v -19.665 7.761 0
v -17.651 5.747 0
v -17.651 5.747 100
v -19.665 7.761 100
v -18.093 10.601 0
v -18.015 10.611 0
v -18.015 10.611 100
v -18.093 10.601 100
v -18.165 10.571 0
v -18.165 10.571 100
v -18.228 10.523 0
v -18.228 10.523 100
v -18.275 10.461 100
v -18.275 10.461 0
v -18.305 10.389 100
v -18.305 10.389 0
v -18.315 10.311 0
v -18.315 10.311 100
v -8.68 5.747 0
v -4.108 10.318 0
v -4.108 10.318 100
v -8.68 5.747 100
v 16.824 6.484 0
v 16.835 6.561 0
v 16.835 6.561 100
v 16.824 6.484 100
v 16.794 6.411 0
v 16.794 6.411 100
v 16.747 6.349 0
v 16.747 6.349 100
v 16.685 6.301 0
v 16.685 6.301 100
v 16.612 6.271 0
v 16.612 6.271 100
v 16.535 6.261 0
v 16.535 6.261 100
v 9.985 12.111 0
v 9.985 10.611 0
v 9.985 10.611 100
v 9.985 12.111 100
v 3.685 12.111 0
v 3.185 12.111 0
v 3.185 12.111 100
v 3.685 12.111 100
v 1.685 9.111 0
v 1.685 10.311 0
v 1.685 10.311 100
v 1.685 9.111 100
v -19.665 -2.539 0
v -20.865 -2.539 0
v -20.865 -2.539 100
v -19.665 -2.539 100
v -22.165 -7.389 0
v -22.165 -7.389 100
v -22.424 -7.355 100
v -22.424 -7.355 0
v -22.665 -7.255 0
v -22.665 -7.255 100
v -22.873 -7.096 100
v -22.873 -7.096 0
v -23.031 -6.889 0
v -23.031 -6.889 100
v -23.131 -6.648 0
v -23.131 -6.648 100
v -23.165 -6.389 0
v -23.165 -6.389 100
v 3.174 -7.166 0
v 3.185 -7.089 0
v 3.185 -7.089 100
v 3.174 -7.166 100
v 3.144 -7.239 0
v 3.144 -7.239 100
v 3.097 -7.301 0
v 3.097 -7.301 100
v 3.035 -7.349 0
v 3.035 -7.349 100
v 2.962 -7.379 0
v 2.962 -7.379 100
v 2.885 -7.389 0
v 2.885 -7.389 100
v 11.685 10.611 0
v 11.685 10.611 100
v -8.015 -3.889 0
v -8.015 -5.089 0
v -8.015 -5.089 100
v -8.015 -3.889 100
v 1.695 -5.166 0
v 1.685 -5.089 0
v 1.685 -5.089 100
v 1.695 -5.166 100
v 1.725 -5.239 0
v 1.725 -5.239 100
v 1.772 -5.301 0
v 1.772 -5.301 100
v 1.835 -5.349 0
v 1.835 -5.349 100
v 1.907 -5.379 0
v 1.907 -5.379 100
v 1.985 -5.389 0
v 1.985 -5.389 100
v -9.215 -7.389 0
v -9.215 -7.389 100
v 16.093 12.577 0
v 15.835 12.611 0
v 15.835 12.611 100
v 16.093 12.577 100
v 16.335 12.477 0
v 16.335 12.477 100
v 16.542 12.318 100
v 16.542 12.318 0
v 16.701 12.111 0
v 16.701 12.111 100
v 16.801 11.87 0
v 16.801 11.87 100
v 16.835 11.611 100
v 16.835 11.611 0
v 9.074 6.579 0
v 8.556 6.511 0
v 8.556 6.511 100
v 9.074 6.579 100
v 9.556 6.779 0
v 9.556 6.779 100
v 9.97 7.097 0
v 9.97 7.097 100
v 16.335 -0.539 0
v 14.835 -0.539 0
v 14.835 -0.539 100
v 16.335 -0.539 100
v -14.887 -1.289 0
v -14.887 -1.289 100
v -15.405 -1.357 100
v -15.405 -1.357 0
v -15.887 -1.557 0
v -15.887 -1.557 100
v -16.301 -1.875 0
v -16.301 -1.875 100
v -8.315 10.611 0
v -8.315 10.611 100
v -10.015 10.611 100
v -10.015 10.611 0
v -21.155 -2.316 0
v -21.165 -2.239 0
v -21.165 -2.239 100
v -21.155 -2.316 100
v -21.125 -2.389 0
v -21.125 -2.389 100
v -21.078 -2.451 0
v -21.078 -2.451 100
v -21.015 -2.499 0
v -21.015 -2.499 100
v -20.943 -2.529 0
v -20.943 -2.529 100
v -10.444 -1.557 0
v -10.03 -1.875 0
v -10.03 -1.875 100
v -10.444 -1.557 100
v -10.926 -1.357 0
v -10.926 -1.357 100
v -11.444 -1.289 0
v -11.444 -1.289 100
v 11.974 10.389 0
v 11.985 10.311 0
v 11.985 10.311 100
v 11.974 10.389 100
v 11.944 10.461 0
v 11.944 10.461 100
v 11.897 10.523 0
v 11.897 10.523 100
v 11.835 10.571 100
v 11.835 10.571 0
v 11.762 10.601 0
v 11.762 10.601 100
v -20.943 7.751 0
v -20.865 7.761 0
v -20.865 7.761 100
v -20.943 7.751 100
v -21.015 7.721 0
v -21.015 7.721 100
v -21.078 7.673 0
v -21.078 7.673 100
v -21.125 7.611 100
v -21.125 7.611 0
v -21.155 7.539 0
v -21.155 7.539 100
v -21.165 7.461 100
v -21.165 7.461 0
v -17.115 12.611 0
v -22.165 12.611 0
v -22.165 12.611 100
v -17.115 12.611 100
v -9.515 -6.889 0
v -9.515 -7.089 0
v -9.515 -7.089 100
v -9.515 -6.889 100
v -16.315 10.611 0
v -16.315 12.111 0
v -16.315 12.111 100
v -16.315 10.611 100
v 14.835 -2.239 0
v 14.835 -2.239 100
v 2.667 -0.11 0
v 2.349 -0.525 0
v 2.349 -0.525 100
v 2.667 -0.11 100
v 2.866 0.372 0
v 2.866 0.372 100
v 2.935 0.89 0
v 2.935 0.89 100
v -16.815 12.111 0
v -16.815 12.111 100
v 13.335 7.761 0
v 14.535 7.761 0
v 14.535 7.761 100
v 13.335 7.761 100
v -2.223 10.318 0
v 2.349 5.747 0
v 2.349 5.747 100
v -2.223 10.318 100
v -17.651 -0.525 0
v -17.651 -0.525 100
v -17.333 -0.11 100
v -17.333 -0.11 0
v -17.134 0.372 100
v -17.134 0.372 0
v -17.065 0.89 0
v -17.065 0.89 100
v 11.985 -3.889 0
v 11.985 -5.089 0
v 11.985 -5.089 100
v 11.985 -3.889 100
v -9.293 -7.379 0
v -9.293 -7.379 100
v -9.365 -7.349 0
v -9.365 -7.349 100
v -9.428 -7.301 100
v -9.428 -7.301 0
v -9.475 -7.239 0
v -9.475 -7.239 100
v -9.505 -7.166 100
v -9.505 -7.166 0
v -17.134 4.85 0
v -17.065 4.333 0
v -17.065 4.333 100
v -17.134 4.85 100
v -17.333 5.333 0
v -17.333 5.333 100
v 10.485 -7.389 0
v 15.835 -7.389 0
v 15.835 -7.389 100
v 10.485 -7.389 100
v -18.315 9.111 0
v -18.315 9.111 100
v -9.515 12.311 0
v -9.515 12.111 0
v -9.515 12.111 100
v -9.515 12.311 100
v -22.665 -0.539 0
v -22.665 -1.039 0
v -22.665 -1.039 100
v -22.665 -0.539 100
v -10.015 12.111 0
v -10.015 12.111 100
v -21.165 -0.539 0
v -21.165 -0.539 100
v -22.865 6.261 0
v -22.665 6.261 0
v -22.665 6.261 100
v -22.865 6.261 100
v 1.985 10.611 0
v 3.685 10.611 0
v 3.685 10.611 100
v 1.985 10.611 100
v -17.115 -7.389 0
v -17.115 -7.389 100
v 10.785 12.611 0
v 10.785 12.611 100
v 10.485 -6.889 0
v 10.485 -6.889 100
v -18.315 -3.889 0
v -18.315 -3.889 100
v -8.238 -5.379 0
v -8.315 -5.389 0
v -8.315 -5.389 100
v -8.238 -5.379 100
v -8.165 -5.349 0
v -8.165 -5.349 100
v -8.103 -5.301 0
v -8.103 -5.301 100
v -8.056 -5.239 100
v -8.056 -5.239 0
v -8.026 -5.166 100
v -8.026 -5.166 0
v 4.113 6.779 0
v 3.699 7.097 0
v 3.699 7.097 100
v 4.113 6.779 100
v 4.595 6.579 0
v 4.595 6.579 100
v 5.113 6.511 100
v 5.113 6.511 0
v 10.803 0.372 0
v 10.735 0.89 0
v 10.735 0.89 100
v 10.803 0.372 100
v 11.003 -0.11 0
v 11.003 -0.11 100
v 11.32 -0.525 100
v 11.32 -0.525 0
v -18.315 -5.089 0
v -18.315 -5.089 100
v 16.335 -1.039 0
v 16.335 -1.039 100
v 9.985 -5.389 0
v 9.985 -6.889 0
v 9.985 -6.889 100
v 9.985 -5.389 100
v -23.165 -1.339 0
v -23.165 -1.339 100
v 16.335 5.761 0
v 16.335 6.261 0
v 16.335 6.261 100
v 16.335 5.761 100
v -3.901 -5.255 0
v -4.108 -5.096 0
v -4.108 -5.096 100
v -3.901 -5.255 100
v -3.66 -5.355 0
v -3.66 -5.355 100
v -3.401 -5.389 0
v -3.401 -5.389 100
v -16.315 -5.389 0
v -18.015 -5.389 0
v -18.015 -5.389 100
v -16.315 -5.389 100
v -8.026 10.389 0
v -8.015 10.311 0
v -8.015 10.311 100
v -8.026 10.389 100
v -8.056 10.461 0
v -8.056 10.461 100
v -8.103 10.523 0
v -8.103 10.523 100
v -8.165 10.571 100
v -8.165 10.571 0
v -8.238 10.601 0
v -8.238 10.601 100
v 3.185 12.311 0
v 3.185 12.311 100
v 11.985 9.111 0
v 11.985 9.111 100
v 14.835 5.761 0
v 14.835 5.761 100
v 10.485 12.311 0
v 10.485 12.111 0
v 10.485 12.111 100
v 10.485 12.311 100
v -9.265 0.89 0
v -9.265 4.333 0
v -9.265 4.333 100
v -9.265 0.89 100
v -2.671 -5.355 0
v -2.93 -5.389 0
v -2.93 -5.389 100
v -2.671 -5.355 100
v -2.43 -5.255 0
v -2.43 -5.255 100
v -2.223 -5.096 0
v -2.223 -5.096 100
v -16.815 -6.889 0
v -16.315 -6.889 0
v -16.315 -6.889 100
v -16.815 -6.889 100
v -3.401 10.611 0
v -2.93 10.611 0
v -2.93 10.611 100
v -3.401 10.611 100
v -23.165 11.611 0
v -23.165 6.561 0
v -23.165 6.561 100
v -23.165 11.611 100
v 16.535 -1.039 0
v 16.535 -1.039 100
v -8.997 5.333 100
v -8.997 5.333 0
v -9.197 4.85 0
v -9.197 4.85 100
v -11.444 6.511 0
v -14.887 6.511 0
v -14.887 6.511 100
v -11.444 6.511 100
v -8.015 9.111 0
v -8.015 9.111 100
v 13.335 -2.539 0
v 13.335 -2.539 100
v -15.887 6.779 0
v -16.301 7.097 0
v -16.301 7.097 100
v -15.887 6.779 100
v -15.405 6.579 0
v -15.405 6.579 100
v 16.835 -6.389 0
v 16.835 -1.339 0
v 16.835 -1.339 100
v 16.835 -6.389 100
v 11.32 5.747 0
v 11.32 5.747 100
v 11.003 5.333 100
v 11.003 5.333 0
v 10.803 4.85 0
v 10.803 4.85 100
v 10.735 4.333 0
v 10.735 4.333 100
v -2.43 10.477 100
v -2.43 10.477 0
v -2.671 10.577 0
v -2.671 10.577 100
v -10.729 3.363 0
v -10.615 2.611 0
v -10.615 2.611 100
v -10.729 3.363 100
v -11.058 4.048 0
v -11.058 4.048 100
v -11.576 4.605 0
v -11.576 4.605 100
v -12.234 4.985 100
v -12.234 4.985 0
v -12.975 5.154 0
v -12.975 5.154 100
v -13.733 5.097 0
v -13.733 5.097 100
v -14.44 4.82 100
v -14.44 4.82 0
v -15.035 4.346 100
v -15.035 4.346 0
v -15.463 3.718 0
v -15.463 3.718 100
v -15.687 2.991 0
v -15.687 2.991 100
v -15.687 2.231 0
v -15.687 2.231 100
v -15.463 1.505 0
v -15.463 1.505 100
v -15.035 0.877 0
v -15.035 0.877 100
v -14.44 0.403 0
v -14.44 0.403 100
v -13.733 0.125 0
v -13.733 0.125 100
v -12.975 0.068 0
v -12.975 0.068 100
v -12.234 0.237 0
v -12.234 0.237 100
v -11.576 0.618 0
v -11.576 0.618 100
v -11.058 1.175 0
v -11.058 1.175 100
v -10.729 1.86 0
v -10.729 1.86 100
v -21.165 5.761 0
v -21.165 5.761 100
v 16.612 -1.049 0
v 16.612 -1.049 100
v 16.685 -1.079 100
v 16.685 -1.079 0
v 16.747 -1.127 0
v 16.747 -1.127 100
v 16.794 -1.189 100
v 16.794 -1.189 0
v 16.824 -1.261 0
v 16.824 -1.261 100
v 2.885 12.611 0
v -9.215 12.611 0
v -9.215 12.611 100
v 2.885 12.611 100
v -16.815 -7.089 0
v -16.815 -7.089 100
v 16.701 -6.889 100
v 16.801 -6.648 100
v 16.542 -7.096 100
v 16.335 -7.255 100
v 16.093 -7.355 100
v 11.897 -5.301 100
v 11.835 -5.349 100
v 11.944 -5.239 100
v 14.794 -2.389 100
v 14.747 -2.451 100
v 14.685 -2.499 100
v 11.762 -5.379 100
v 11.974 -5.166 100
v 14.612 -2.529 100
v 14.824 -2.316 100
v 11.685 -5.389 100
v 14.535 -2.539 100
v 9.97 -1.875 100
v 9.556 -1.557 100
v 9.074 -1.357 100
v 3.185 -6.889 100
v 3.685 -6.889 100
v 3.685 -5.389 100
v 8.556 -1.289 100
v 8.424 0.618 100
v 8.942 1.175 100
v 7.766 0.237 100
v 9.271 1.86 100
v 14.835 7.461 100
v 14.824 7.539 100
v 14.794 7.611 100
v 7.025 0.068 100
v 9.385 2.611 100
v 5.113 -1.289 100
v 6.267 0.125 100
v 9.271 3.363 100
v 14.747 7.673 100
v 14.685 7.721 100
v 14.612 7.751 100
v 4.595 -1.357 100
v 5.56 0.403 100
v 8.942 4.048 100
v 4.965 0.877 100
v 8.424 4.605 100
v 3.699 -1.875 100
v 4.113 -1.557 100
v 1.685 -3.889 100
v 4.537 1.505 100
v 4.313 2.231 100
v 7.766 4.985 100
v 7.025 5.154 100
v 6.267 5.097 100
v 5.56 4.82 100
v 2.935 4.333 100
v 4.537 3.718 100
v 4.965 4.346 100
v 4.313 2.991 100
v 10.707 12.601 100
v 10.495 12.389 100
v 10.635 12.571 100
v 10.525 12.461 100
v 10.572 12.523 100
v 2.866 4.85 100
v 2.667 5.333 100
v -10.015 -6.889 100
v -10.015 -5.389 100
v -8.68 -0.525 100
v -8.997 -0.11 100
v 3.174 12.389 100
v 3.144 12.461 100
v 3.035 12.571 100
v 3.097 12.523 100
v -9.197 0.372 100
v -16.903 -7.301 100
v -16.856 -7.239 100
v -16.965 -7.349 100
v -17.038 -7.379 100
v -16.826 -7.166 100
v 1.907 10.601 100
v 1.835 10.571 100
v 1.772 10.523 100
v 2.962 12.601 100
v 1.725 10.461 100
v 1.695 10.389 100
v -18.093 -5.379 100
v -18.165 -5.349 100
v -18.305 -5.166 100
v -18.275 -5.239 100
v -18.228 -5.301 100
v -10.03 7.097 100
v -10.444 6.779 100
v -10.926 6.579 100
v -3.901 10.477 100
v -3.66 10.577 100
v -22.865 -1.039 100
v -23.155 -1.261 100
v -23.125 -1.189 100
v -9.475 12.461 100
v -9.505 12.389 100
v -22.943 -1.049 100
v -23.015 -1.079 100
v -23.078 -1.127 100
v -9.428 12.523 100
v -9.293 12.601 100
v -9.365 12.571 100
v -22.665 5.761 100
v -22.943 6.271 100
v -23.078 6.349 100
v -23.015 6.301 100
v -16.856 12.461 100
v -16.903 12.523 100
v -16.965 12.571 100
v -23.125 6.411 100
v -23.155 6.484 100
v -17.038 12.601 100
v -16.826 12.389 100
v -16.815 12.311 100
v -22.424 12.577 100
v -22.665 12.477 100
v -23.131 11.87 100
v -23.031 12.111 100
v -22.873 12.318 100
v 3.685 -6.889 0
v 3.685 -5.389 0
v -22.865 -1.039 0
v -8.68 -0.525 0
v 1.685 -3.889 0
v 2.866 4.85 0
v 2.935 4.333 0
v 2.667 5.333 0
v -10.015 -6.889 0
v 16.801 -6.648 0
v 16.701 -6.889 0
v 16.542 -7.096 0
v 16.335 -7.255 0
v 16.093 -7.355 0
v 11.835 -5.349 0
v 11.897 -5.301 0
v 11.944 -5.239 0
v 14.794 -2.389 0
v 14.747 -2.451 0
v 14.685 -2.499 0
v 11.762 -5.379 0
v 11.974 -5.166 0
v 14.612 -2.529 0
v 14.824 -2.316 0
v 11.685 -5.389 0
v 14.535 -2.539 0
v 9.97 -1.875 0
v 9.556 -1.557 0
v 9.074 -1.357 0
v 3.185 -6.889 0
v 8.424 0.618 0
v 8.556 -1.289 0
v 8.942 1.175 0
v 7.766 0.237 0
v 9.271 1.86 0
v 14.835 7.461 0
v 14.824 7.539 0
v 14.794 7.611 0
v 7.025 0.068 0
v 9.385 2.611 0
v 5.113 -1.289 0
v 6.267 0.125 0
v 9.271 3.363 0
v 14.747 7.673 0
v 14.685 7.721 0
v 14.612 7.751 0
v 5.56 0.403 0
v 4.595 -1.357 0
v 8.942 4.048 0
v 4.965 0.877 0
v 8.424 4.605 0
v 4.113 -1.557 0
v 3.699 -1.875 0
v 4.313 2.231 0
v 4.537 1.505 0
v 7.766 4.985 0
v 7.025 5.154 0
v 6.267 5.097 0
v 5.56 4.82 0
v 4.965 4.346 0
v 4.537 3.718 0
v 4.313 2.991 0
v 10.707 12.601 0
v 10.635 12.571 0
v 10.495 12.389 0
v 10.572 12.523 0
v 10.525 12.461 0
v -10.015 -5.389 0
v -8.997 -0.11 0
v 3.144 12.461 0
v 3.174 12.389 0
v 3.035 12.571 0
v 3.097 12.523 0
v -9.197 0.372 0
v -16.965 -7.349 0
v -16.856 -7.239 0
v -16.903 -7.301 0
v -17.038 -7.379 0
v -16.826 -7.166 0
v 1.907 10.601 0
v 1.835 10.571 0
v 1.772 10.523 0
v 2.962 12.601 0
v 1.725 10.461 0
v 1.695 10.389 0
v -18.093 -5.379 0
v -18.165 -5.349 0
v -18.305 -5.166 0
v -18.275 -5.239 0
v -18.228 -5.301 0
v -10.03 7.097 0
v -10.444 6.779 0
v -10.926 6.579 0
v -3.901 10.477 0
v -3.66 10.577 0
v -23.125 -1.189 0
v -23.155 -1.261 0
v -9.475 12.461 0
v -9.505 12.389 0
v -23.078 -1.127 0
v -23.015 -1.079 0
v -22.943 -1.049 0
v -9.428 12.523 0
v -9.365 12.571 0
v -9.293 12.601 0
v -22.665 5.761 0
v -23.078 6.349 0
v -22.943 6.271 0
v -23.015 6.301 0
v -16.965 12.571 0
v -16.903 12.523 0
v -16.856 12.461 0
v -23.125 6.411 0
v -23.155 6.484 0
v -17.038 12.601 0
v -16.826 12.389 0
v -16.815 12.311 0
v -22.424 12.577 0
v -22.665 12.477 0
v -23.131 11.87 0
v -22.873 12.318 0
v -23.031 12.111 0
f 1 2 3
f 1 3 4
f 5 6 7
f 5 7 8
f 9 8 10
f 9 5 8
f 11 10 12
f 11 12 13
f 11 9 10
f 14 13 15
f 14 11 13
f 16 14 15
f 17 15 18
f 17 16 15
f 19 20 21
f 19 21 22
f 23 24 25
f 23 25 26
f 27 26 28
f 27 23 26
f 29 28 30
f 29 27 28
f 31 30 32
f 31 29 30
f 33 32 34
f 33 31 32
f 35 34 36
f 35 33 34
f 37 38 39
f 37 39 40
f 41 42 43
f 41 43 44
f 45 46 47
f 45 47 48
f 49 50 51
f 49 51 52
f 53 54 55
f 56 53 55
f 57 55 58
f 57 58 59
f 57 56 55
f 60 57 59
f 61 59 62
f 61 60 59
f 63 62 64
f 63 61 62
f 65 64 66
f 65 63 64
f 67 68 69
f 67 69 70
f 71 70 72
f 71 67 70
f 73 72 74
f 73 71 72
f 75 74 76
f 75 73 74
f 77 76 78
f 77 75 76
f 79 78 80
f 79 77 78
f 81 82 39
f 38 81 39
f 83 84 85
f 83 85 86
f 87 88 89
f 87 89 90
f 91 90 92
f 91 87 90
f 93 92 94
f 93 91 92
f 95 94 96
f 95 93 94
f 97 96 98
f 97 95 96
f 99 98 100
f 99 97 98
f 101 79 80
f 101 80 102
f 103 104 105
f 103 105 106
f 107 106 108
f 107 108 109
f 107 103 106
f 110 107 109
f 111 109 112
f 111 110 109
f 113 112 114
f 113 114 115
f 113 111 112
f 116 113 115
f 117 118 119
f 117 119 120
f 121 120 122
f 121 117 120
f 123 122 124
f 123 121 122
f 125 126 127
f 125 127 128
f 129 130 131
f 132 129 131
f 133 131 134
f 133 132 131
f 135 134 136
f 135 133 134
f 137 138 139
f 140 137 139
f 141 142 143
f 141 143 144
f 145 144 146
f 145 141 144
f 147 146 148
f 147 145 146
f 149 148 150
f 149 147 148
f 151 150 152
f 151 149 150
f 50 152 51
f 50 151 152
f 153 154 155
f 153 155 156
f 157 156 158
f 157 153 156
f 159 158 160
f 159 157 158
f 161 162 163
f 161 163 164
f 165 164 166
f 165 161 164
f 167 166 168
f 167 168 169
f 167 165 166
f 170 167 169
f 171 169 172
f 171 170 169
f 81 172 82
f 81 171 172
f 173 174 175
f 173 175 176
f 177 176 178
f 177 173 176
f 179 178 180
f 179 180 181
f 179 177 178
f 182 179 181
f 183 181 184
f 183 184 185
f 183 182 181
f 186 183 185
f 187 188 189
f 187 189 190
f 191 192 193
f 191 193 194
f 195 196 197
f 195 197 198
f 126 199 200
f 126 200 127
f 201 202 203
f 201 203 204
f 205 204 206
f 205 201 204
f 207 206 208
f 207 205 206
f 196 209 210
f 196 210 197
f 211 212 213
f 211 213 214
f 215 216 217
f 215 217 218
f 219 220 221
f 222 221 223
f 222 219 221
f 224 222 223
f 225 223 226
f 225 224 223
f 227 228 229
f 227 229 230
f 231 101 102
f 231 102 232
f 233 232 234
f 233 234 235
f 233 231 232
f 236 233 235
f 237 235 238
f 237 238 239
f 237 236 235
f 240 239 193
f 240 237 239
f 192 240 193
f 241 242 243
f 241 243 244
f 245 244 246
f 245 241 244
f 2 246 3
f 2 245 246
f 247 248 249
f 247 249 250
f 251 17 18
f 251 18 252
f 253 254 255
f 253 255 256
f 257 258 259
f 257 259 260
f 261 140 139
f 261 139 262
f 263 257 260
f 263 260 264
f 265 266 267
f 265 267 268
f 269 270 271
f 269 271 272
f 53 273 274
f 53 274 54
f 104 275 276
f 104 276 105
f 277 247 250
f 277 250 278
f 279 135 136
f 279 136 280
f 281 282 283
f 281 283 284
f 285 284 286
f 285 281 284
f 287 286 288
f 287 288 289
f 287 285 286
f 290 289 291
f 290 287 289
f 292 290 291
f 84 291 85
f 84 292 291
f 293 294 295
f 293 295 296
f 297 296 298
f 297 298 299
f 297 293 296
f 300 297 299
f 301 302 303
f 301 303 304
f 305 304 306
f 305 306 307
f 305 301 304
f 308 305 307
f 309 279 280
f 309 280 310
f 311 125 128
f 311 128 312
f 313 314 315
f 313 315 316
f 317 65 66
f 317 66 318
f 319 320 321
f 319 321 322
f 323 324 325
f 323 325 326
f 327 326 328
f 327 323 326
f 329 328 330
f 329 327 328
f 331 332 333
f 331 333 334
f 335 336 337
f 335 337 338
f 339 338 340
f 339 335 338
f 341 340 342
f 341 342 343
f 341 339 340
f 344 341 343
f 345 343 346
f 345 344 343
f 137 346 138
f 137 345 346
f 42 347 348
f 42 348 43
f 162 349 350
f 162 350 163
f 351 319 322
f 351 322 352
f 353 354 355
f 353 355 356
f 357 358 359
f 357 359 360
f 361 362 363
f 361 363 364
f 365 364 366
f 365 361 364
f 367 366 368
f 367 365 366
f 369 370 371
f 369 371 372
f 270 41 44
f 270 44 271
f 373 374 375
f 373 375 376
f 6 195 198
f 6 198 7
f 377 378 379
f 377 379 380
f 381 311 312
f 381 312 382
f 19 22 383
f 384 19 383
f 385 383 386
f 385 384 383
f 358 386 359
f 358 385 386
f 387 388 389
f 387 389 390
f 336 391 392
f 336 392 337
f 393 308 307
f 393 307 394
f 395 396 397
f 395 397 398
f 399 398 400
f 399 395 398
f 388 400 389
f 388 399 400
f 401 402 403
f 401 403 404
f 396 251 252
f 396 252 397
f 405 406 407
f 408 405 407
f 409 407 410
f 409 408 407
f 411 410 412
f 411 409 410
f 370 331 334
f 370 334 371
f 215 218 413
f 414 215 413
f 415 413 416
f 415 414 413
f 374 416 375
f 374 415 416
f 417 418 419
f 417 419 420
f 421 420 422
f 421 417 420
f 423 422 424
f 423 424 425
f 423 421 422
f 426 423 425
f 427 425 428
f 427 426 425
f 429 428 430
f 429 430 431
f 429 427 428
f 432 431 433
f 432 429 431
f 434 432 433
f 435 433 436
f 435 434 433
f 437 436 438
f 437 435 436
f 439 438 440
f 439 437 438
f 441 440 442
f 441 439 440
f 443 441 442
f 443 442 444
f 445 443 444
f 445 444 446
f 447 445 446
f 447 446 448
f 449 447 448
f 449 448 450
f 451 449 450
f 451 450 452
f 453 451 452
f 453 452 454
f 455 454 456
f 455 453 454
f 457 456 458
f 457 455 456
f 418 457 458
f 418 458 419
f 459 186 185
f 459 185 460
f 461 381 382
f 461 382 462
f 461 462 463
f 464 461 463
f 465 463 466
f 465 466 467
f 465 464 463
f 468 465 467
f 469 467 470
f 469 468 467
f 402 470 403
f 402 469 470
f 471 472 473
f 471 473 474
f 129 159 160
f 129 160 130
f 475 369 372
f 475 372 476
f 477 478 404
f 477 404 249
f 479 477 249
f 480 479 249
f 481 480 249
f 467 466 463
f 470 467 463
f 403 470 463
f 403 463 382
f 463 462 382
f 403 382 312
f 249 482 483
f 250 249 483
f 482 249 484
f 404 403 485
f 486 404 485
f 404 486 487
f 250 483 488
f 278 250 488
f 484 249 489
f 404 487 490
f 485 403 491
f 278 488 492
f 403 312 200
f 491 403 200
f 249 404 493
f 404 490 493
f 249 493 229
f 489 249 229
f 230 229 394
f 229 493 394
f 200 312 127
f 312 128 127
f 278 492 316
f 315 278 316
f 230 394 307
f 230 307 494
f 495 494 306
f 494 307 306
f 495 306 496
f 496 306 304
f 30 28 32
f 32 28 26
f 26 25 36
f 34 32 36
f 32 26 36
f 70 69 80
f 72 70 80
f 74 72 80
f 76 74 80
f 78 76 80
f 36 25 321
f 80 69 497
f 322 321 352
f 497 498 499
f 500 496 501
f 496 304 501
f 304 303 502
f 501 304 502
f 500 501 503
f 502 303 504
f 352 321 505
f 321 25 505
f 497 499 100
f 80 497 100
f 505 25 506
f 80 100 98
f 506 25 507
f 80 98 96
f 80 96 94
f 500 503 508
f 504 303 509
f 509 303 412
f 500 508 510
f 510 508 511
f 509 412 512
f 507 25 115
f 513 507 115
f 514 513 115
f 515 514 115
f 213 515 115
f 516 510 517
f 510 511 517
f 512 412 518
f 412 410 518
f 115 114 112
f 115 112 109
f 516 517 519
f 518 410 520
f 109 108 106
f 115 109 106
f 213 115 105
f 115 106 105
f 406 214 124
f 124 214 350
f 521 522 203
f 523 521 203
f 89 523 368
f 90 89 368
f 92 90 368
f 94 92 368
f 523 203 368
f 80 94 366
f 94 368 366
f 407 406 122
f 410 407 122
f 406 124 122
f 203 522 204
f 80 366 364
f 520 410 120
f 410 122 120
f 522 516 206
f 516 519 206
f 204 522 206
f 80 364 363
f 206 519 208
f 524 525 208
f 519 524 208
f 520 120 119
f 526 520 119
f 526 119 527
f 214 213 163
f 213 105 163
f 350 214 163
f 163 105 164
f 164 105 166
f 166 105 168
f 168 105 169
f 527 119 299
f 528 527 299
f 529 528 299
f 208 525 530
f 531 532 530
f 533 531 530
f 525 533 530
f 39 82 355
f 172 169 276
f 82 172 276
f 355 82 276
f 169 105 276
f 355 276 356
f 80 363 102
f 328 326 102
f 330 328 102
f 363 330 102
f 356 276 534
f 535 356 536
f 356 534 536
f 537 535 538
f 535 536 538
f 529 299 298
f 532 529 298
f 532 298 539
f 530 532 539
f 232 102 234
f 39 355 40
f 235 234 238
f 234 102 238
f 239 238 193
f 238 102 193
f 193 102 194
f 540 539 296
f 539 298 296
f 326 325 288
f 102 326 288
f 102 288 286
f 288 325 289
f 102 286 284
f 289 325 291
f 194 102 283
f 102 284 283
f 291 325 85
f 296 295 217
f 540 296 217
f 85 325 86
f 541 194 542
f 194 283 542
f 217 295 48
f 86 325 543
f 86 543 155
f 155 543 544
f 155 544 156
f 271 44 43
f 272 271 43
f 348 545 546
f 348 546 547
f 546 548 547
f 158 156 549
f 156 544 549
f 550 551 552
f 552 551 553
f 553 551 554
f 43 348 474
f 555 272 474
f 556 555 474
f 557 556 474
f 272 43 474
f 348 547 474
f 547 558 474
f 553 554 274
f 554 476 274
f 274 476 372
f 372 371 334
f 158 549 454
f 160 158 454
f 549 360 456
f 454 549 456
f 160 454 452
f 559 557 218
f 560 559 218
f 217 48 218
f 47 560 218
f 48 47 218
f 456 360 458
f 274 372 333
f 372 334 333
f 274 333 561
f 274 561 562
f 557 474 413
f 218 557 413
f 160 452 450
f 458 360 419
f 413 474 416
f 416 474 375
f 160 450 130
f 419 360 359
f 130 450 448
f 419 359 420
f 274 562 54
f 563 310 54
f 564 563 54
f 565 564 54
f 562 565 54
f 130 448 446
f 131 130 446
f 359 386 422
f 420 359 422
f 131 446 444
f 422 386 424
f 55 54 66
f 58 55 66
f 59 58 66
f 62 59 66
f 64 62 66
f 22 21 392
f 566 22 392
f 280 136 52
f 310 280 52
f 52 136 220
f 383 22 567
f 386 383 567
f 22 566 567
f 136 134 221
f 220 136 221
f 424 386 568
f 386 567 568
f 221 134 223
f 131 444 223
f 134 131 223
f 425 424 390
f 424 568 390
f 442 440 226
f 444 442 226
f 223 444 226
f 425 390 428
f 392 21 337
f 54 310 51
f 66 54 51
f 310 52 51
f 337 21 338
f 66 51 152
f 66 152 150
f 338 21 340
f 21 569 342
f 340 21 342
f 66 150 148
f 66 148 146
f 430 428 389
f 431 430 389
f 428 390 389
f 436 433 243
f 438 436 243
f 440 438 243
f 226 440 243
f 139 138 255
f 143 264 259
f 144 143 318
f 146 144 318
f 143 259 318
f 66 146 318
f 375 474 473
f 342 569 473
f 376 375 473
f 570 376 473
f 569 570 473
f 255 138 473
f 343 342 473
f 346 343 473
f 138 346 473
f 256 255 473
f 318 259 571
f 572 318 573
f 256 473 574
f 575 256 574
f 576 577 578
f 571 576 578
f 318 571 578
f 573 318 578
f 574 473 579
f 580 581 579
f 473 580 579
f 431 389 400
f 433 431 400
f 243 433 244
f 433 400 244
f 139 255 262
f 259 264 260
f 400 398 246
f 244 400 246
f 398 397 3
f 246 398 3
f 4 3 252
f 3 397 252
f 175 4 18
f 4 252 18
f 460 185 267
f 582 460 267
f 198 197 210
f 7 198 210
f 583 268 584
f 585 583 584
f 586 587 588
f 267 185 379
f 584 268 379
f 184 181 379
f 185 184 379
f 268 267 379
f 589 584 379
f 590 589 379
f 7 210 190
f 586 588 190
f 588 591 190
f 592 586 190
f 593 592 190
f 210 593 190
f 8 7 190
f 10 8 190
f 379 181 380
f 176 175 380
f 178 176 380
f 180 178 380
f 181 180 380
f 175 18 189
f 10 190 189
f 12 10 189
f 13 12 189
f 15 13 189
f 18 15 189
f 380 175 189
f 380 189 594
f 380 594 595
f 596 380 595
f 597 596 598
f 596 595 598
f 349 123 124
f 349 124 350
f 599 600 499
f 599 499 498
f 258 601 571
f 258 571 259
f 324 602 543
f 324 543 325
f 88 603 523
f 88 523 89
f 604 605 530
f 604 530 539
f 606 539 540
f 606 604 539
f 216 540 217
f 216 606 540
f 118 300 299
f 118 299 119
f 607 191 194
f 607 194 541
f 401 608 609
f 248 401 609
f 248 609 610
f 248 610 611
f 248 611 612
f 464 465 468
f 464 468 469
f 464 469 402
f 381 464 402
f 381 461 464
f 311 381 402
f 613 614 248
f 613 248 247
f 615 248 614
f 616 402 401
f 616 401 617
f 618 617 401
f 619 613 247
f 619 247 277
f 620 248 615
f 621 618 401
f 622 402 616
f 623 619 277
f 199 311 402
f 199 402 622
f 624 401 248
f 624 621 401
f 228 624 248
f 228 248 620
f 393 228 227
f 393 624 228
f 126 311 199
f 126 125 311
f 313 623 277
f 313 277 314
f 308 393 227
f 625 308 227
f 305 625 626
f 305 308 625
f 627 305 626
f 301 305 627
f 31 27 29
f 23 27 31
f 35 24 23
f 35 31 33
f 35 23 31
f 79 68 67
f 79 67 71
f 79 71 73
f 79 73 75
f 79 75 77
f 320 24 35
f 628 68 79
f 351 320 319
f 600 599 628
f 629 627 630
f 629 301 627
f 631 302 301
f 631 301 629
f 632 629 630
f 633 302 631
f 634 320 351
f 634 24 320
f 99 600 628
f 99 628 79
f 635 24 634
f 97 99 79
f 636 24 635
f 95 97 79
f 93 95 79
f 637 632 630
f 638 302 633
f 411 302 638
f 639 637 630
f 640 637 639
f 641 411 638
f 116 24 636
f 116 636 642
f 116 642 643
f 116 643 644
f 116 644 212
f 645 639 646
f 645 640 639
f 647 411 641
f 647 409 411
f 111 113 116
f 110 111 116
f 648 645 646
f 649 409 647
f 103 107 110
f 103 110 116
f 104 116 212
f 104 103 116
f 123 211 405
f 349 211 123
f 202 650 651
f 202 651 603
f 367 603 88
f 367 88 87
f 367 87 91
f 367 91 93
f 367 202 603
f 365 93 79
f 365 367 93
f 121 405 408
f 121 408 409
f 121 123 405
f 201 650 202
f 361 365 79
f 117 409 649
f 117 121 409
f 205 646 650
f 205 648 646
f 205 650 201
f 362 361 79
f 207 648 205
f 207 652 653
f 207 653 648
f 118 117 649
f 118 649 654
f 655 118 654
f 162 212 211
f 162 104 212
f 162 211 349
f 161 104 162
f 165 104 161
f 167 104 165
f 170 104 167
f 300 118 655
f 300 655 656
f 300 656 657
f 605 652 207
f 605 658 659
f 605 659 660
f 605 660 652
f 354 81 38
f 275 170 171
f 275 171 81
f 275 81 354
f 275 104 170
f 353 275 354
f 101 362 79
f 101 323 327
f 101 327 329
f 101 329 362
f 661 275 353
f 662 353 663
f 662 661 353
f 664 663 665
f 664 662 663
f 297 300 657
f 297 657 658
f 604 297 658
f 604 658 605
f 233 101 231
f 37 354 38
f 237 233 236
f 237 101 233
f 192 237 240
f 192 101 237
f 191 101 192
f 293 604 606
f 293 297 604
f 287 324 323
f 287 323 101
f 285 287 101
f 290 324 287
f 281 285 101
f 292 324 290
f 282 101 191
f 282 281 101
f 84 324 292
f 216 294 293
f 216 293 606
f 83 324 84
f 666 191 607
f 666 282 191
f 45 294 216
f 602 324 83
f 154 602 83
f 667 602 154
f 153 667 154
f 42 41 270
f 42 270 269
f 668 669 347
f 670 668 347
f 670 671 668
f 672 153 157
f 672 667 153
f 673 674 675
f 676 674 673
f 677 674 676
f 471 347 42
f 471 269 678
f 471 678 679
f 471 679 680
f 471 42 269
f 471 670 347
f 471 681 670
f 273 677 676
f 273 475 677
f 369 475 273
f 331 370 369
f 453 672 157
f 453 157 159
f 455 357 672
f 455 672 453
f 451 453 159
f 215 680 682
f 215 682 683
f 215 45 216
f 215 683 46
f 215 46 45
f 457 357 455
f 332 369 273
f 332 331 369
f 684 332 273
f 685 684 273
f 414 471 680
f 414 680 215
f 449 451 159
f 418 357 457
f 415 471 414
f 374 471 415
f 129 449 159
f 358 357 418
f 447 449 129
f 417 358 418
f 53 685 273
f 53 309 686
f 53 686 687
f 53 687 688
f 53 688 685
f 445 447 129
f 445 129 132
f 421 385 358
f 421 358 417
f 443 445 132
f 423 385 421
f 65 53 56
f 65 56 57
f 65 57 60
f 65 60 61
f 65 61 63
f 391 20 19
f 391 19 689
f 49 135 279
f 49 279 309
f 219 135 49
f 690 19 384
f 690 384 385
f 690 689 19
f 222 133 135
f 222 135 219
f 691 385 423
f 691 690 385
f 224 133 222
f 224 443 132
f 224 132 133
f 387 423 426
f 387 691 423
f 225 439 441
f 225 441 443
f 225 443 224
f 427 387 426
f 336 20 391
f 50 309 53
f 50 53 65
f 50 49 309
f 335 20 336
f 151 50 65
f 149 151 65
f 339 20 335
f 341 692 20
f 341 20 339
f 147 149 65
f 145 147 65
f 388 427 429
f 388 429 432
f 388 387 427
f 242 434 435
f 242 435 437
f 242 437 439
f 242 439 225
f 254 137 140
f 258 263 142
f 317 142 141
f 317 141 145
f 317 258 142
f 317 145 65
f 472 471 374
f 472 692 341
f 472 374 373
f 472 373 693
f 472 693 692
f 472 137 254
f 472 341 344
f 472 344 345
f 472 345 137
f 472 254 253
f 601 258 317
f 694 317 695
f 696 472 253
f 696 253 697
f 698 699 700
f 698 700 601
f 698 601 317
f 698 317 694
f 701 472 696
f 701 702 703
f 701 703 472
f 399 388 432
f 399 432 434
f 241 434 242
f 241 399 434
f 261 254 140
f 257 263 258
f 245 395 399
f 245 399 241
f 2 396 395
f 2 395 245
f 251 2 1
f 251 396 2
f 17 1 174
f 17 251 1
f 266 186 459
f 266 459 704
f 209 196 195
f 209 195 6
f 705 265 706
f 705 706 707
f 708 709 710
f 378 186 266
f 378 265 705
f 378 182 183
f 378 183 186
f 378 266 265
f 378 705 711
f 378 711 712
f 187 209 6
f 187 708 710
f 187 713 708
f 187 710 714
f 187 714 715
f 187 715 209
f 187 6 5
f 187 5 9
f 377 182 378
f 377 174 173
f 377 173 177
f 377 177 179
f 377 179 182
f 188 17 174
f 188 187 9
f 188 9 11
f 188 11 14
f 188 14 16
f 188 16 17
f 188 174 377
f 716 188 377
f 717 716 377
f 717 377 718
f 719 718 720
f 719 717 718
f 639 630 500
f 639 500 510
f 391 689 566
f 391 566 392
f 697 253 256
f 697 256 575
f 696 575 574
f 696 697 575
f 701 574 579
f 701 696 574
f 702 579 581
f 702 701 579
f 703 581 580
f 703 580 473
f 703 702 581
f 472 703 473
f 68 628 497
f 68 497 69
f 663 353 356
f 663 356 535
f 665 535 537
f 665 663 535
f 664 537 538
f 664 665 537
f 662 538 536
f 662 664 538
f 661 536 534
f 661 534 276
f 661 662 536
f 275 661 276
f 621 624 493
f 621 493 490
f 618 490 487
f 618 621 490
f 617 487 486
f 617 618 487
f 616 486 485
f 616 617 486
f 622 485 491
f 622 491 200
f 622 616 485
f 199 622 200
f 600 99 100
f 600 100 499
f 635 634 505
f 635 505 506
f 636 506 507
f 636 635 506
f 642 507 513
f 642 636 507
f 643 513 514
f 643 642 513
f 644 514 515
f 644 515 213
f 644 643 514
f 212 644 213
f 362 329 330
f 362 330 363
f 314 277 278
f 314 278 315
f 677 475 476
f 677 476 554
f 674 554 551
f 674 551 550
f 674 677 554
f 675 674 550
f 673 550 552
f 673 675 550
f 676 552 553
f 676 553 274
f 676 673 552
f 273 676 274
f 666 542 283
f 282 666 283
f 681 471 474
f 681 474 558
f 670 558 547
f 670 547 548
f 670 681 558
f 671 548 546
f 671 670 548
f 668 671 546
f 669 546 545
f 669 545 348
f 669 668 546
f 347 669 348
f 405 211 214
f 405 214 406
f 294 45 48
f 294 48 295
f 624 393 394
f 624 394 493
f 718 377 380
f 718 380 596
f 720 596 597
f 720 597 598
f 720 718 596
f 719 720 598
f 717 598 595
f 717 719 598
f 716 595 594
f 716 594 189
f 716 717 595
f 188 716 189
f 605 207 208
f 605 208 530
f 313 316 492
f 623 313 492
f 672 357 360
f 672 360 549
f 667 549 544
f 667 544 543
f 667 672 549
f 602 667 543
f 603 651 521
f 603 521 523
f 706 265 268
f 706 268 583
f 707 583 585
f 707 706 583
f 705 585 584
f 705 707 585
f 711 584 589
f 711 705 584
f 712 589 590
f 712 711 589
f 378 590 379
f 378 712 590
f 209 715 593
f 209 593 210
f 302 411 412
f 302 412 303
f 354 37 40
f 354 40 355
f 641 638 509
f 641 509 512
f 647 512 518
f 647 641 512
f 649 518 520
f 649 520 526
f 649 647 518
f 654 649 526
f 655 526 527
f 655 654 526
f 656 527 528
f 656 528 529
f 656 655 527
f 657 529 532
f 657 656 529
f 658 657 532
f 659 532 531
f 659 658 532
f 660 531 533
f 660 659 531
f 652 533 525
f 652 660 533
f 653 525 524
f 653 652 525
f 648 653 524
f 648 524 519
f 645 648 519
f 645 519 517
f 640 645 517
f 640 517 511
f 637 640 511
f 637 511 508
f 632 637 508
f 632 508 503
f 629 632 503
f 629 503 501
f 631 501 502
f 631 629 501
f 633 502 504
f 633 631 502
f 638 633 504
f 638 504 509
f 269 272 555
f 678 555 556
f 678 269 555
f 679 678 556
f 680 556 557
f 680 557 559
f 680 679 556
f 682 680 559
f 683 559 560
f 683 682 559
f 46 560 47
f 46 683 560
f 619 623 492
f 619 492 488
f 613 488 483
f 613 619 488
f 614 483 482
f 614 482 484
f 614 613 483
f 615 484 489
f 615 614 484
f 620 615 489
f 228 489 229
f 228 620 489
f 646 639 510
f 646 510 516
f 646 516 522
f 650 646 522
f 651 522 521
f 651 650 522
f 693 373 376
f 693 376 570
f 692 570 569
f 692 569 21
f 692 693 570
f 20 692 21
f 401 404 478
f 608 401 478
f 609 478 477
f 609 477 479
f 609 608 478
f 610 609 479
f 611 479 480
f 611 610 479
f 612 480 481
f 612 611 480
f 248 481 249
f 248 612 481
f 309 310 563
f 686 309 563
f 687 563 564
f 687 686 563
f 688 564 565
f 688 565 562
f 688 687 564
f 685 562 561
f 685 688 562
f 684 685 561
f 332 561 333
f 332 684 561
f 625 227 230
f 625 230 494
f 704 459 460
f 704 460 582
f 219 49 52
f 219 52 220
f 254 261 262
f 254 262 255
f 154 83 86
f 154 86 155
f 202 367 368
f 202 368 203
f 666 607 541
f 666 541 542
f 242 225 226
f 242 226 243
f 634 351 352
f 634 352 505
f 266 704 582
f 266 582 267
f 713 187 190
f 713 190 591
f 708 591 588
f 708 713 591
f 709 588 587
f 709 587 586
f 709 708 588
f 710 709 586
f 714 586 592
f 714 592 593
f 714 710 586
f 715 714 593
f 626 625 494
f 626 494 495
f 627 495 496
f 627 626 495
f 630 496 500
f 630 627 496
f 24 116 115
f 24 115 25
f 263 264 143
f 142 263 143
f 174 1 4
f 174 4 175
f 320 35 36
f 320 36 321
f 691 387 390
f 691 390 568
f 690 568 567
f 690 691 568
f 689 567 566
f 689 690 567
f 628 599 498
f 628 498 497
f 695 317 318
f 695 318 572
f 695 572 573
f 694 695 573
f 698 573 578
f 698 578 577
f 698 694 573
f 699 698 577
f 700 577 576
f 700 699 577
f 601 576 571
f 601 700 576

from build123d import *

# Parameters (mm, degrees)
SKETCH_1_R      = 2.55
EXTRUDE_1_DEPTH = 100


with BuildPart() as part:
    # 草图1 → 凸台-拉伸1 (new body)
    with BuildSketch(Plane.XY):
        with BuildLine():
            Line((-23.165408345, -6.388804564), (-23.165408345, -1.338804564))
            ThreePointArc((-23.165408345, -1.338804564), (-23.077540379, -1.12667253), (-22.865408345, -1.038804564))
            Line((-22.865408345, -1.038804564), (-22.665408345, -1.038804564))
            Line((-22.665408345, -1.038804564), (-22.665408345, -0.538804564))
            Line((-22.665408345, -0.538804564), (-21.165408345, -0.538804564))
            Line((-21.165408345, -0.538804564), (-21.165408345, -2.238804564))
            ThreePointArc((-21.165408345, -2.238804564), (-21.077540379, -2.450936598), (-20.865408345, -2.538804564))
            Line((-20.865408345, -2.538804564), (-19.665408345, -2.538804564))
            Line((-19.665408345, -2.538804564), (-17.651194783, -0.524591002))
            ThreePointArc((-17.651194783, -0.524591002), (-17.21764928, 0.124255696), (-17.065408345, 0.889622561))
            Line((-17.065408345, 0.889622561), (-17.065408345, 4.332768311))
            ThreePointArc((-17.065408345, 4.332768311), (-17.21764928, 5.098135176), (-17.651194783, 5.746981874))
            Line((-17.651194783, 5.746981874), (-19.665408345, 7.761195436))
            Line((-19.665408345, 7.761195436), (-20.865408345, 7.761195436))
            ThreePointArc((-20.865408345, 7.761195436), (-21.077540379, 7.67332747), (-21.165408345, 7.461195436))
            Line((-21.165408345, 7.461195436), (-21.165408345, 5.761195436))
            Line((-21.165408345, 5.761195436), (-22.665408345, 5.761195436))
            Line((-22.665408345, 5.761195436), (-22.665408345, 6.261195436))
            Line((-22.665408345, 6.261195436), (-22.865408345, 6.261195436))
            ThreePointArc((-22.865408345, 6.261195436), (-23.077540379, 6.349063402), (-23.165408345, 6.561195436))
            Line((-23.165408345, 6.561195436), (-23.165408345, 11.611195436))
            ThreePointArc((-23.165408345, 11.611195436), (-22.872515126, 12.318302217), (-22.165408345, 12.611195436))
            Line((-22.165408345, 12.611195436), (-17.115408345, 12.611195436))
            ThreePointArc((-17.115408345, 12.611195436), (-16.903276311, 12.52332747), (-16.815408345, 12.311195436))
            Line((-16.815408345, 12.311195436), (-16.815408345, 12.111195436))
            Line((-16.815408345, 12.111195436), (-16.315408345, 12.111195436))
            Line((-16.315408345, 12.111195436), (-16.315408345, 10.611195436))
            Line((-16.315408345, 10.611195436), (-18.015408345, 10.611195436))
            ThreePointArc((-18.015408345, 10.611195436), (-18.227540379, 10.52332747), (-18.315408345, 10.311195436))
            Line((-18.315408345, 10.311195436), (-18.315408345, 9.111195436))
            Line((-18.315408345, 9.111195436), (-16.301194783, 7.096981874))
            ThreePointArc((-16.301194783, 7.096981874), (-15.652348085, 6.663436371), (-14.88698122, 6.511195436))
            Line((-14.88698122, 6.511195436), (-11.44383547, 6.511195436))
            ThreePointArc((-11.44383547, 6.511195436), (-10.678468605, 6.663436371), (-10.029621907, 7.096981874))
            Line((-10.029621907, 7.096981874), (-8.015408345, 9.111195436))
            Line((-8.015408345, 9.111195436), (-8.015408345, 10.311195436))
            ThreePointArc((-8.015408345, 10.311195436), (-8.103276311, 10.52332747), (-8.315408345, 10.611195436))
            Line((-8.315408345, 10.611195436), (-10.015408345, 10.611195436))
            Line((-10.015408345, 10.611195436), (-10.015408345, 12.111195436))
            Line((-10.015408345, 12.111195436), (-9.515408345, 12.111195436))
            Line((-9.515408345, 12.111195436), (-9.515408345, 12.311195436))
            ThreePointArc((-9.515408345, 12.311195436), (-9.427540379, 12.52332747), (-9.215408345, 12.611195436))
            Line((-9.215408345, 12.611195436), (2.884591655, 12.611195436))
            ThreePointArc((2.884591655, 12.611195436), (3.096723689, 12.52332747), (3.184591655, 12.311195436))
            Line((3.184591655, 12.311195436), (3.184591655, 12.111195436))
            Line((3.184591655, 12.111195436), (3.684591655, 12.111195436))
            Line((3.684591655, 12.111195436), (3.684591655, 10.611195436))
            Line((3.684591655, 10.611195436), (1.984591655, 10.611195436))
            ThreePointArc((1.984591655, 10.611195436), (1.772459621, 10.52332747), (1.684591655, 10.311195436))
            Line((1.684591655, 10.311195436), (1.684591655, 9.111195436))
            Line((1.684591655, 9.111195436), (3.698805217, 7.096981874))
            ThreePointArc((3.698805217, 7.096981874), (4.347651915, 6.663436371), (5.11301878, 6.511195436))
            Line((5.11301878, 6.511195436), (8.55616453, 6.511195436))
            ThreePointArc((8.55616453, 6.511195436), (9.321531395, 6.663436371), (9.970378093, 7.096981874))
            Line((9.970378093, 7.096981874), (11.984591655, 9.111195436))
            Line((11.984591655, 9.111195436), (11.984591655, 10.311195436))
            ThreePointArc((11.984591655, 10.311195436), (11.896723689, 10.52332747), (11.684591655, 10.611195436))
            Line((11.684591655, 10.611195436), (9.984591655, 10.611195436))
            Line((9.984591655, 10.611195436), (9.984591655, 12.111195436))
            Line((9.984591655, 12.111195436), (10.484591655, 12.111195436))
            Line((10.484591655, 12.111195436), (10.484591655, 12.311195436))
            ThreePointArc((10.484591655, 12.311195436), (10.572459621, 12.52332747), (10.784591655, 12.611195436))
            Line((10.784591655, 12.611195436), (15.834591655, 12.611195436))
            ThreePointArc((15.834591655, 12.611195436), (16.541698436, 12.318302217), (16.834591655, 11.611195436))
            Line((16.834591655, 11.611195436), (16.834591655, 6.561195436))
            ThreePointArc((16.834591655, 6.561195436), (16.746723689, 6.349063402), (16.534591655, 6.261195436))
            Line((16.534591655, 6.261195436), (16.334591655, 6.261195436))
            Line((16.334591655, 6.261195436), (16.334591655, 5.761195436))
            Line((16.334591655, 5.761195436), (14.834591655, 5.761195436))
            Line((14.834591655, 5.761195436), (14.834591655, 7.461195436))
            ThreePointArc((14.834591655, 7.461195436), (14.746723689, 7.67332747), (14.534591655, 7.761195436))
            Line((14.534591655, 7.761195436), (13.334591655, 7.761195436))
            Line((13.334591655, 7.761195436), (11.320378093, 5.746981874))
            ThreePointArc((11.320378093, 5.746981874), (10.88683259, 5.098135176), (10.734591655, 4.332768311))
            Line((10.734591655, 4.332768311), (10.734591655, 0.889622561))
            ThreePointArc((10.734591655, 0.889622561), (10.88683259, 0.124255696), (11.320378093, -0.524591002))
            Line((11.320378093, -0.524591002), (13.334591655, -2.538804564))
            Line((13.334591655, -2.538804564), (14.534591655, -2.538804564))
            ThreePointArc((14.534591655, -2.538804564), (14.746723689, -2.450936598), (14.834591655, -2.238804564))
            Line((14.834591655, -2.238804564), (14.834591655, -0.538804564))
            Line((14.834591655, -0.538804564), (16.334591655, -0.538804564))
            Line((16.334591655, -0.538804564), (16.334591655, -1.038804564))
            Line((16.334591655, -1.038804564), (16.534591655, -1.038804564))
            ThreePointArc((16.534591655, -1.038804564), (16.746723689, -1.12667253), (16.834591655, -1.338804564))
            Line((16.834591655, -1.338804564), (16.834591655, -6.388804564))
            ThreePointArc((16.834591655, -6.388804564), (16.541698436, -7.095911345), (15.834591655, -7.388804564))
            Line((15.834591655, -7.388804564), (10.484591655, -7.388804564))
            Line((10.484591655, -7.388804564), (10.484591655, -6.888804564))
            Line((10.484591655, -6.888804564), (9.984591655, -6.888804564))
            Line((9.984591655, -6.888804564), (9.984591655, -5.388804564))
            Line((9.984591655, -5.388804564), (11.684591655, -5.388804564))
            ThreePointArc((11.684591655, -5.388804564), (11.896723689, -5.300936598), (11.984591655, -5.088804564))
            Line((11.984591655, -5.088804564), (11.984591655, -3.888804564))
            Line((11.984591655, -3.888804564), (9.970378093, -1.874591002))
            ThreePointArc((9.970378093, -1.874591002), (9.321531395, -1.441045499), (8.55616453, -1.288804564))
            Line((8.55616453, -1.288804564), (5.11301878, -1.288804564))
            ThreePointArc((5.11301878, -1.288804564), (4.347651915, -1.441045499), (3.698805217, -1.874591002))
            Line((3.698805217, -1.874591002), (1.684591655, -3.888804564))
            Line((1.684591655, -3.888804564), (1.684591655, -5.088804564))
            ThreePointArc((1.684591655, -5.088804564), (1.772459621, -5.300936598), (1.984591655, -5.388804564))
            Line((1.984591655, -5.388804564), (3.684591655, -5.388804564))
            Line((3.684591655, -5.388804564), (3.684591655, -6.888804564))
            Line((3.684591655, -6.888804564), (3.184591655, -6.888804564))
            Line((3.184591655, -6.888804564), (3.184591655, -7.088804564))
            ThreePointArc((3.184591655, -7.088804564), (3.096723689, -7.300936598), (2.884591655, -7.388804564))
            Line((2.884591655, -7.388804564), (-3.165408345, -7.388804564))
            Line((-3.165408345, -7.388804564), (-9.215408345, -7.388804564))
            ThreePointArc((-9.215408345, -7.388804564), (-9.427540379, -7.300936598), (-9.515408345, -7.088804564))
            Line((-9.515408345, -7.088804564), (-9.515408345, -6.888804564))
            Line((-9.515408345, -6.888804564), (-10.015408345, -6.888804564))
            Line((-10.015408345, -6.888804564), (-10.015408345, -5.388804564))
            Line((-10.015408345, -5.388804564), (-8.315408345, -5.388804564))
            ThreePointArc((-8.315408345, -5.388804564), (-8.103276311, -5.300936598), (-8.015408345, -5.088804564))
            Line((-8.015408345, -5.088804564), (-8.015408345, -3.888804564))
            Line((-8.015408345, -3.888804564), (-10.029621907, -1.874591002))
            ThreePointArc((-10.029621907, -1.874591002), (-10.678468605, -1.441045499), (-11.44383547, -1.288804564))
            Line((-11.44383547, -1.288804564), (-14.88698122, -1.288804564))
            ThreePointArc((-14.88698122, -1.288804564), (-15.652348085, -1.441045499), (-16.301194783, -1.874591002))
            Line((-16.301194783, -1.874591002), (-18.315408345, -3.888804564))
            Line((-18.315408345, -3.888804564), (-18.315408345, -5.088804564))
            ThreePointArc((-18.315408345, -5.088804564), (-18.227540379, -5.300936598), (-18.015408345, -5.388804564))
            Line((-18.015408345, -5.388804564), (-16.315408345, -5.388804564))
            Line((-16.315408345, -5.388804564), (-16.315408345, -6.888804564))
            Line((-16.315408345, -6.888804564), (-16.815408345, -6.888804564))
            Line((-16.815408345, -6.888804564), (-16.815408345, -7.088804564))
            ThreePointArc((-16.815408345, -7.088804564), (-16.903276311, -7.300936598), (-17.115408345, -7.388804564))
            Line((-17.115408345, -7.388804564), (-22.165408345, -7.388804564))
            ThreePointArc((-22.165408345, -7.388804564), (-22.872515126, -7.095911345), (-23.165408345, -6.388804564))
        make_face()
        with Locations((-13.165408345, 2.611195436)):
            Circle(SKETCH_1_R, mode=Mode.SUBTRACT)
        with Locations((6.834591655, 2.611195436)):
            Circle(SKETCH_1_R, mode=Mode.SUBTRACT)
        with BuildLine():
            Line((-9.265408345, 4.332768311), (-9.265408345, 0.889622561))
            ThreePointArc((-9.265408345, 0.889622561), (-9.11316741, 0.124255696), (-8.679621907, -0.524591002))
            Line((-8.679621907, -0.524591002), (-6.665408345, -2.538804564))
            Line((-6.665408345, -2.538804564), (-4.108301564, -5.095911345))
            ThreePointArc((-4.108301564, -5.095911345), (-3.783878215, -5.312684096), (-3.401194783, -5.388804564))
            Line((-3.401194783, -5.388804564), (-2.929621907, -5.388804564))
            ThreePointArc((-2.929621907, -5.388804564), (-2.546938475, -5.312684096), (-2.222515126, -5.095911345))
            Line((-2.222515126, -5.095911345), (0.334591655, -2.538804564))
            Line((0.334591655, -2.538804564), (2.348805217, -0.524591002))
            ThreePointArc((2.348805217, -0.524591002), (2.78235072, 0.124255696), (2.934591655, 0.889622561))
            Line((2.934591655, 0.889622561), (2.934591655, 4.332768311))
            ThreePointArc((2.934591655, 4.332768311), (2.78235072, 5.098135176), (2.348805217, 5.746981874))
            Line((2.348805217, 5.746981874), (0.334591655, 7.761195436))
            Line((0.334591655, 7.761195436), (-2.222515126, 10.318302217))
            ThreePointArc((-2.222515126, 10.318302217), (-2.546938475, 10.535074969), (-2.929621907, 10.611195436))
            Line((-2.929621907, 10.611195436), (-3.401194783, 10.611195436))
            ThreePointArc((-3.401194783, 10.611195436), (-3.783878215, 10.535074969), (-4.108301564, 10.318302217))
            Line((-4.108301564, 10.318302217), (-6.665408345, 7.761195436))
            Line((-6.665408345, 7.761195436), (-8.679621907, 5.746981874))
            ThreePointArc((-8.679621907, 5.746981874), (-9.11316741, 5.098135176), (-9.265408345, 4.332768311))
        make_face(mode=Mode.SUBTRACT)
    extrude(amount=EXTRUDE_1_DEPTH)


solid = part.part
